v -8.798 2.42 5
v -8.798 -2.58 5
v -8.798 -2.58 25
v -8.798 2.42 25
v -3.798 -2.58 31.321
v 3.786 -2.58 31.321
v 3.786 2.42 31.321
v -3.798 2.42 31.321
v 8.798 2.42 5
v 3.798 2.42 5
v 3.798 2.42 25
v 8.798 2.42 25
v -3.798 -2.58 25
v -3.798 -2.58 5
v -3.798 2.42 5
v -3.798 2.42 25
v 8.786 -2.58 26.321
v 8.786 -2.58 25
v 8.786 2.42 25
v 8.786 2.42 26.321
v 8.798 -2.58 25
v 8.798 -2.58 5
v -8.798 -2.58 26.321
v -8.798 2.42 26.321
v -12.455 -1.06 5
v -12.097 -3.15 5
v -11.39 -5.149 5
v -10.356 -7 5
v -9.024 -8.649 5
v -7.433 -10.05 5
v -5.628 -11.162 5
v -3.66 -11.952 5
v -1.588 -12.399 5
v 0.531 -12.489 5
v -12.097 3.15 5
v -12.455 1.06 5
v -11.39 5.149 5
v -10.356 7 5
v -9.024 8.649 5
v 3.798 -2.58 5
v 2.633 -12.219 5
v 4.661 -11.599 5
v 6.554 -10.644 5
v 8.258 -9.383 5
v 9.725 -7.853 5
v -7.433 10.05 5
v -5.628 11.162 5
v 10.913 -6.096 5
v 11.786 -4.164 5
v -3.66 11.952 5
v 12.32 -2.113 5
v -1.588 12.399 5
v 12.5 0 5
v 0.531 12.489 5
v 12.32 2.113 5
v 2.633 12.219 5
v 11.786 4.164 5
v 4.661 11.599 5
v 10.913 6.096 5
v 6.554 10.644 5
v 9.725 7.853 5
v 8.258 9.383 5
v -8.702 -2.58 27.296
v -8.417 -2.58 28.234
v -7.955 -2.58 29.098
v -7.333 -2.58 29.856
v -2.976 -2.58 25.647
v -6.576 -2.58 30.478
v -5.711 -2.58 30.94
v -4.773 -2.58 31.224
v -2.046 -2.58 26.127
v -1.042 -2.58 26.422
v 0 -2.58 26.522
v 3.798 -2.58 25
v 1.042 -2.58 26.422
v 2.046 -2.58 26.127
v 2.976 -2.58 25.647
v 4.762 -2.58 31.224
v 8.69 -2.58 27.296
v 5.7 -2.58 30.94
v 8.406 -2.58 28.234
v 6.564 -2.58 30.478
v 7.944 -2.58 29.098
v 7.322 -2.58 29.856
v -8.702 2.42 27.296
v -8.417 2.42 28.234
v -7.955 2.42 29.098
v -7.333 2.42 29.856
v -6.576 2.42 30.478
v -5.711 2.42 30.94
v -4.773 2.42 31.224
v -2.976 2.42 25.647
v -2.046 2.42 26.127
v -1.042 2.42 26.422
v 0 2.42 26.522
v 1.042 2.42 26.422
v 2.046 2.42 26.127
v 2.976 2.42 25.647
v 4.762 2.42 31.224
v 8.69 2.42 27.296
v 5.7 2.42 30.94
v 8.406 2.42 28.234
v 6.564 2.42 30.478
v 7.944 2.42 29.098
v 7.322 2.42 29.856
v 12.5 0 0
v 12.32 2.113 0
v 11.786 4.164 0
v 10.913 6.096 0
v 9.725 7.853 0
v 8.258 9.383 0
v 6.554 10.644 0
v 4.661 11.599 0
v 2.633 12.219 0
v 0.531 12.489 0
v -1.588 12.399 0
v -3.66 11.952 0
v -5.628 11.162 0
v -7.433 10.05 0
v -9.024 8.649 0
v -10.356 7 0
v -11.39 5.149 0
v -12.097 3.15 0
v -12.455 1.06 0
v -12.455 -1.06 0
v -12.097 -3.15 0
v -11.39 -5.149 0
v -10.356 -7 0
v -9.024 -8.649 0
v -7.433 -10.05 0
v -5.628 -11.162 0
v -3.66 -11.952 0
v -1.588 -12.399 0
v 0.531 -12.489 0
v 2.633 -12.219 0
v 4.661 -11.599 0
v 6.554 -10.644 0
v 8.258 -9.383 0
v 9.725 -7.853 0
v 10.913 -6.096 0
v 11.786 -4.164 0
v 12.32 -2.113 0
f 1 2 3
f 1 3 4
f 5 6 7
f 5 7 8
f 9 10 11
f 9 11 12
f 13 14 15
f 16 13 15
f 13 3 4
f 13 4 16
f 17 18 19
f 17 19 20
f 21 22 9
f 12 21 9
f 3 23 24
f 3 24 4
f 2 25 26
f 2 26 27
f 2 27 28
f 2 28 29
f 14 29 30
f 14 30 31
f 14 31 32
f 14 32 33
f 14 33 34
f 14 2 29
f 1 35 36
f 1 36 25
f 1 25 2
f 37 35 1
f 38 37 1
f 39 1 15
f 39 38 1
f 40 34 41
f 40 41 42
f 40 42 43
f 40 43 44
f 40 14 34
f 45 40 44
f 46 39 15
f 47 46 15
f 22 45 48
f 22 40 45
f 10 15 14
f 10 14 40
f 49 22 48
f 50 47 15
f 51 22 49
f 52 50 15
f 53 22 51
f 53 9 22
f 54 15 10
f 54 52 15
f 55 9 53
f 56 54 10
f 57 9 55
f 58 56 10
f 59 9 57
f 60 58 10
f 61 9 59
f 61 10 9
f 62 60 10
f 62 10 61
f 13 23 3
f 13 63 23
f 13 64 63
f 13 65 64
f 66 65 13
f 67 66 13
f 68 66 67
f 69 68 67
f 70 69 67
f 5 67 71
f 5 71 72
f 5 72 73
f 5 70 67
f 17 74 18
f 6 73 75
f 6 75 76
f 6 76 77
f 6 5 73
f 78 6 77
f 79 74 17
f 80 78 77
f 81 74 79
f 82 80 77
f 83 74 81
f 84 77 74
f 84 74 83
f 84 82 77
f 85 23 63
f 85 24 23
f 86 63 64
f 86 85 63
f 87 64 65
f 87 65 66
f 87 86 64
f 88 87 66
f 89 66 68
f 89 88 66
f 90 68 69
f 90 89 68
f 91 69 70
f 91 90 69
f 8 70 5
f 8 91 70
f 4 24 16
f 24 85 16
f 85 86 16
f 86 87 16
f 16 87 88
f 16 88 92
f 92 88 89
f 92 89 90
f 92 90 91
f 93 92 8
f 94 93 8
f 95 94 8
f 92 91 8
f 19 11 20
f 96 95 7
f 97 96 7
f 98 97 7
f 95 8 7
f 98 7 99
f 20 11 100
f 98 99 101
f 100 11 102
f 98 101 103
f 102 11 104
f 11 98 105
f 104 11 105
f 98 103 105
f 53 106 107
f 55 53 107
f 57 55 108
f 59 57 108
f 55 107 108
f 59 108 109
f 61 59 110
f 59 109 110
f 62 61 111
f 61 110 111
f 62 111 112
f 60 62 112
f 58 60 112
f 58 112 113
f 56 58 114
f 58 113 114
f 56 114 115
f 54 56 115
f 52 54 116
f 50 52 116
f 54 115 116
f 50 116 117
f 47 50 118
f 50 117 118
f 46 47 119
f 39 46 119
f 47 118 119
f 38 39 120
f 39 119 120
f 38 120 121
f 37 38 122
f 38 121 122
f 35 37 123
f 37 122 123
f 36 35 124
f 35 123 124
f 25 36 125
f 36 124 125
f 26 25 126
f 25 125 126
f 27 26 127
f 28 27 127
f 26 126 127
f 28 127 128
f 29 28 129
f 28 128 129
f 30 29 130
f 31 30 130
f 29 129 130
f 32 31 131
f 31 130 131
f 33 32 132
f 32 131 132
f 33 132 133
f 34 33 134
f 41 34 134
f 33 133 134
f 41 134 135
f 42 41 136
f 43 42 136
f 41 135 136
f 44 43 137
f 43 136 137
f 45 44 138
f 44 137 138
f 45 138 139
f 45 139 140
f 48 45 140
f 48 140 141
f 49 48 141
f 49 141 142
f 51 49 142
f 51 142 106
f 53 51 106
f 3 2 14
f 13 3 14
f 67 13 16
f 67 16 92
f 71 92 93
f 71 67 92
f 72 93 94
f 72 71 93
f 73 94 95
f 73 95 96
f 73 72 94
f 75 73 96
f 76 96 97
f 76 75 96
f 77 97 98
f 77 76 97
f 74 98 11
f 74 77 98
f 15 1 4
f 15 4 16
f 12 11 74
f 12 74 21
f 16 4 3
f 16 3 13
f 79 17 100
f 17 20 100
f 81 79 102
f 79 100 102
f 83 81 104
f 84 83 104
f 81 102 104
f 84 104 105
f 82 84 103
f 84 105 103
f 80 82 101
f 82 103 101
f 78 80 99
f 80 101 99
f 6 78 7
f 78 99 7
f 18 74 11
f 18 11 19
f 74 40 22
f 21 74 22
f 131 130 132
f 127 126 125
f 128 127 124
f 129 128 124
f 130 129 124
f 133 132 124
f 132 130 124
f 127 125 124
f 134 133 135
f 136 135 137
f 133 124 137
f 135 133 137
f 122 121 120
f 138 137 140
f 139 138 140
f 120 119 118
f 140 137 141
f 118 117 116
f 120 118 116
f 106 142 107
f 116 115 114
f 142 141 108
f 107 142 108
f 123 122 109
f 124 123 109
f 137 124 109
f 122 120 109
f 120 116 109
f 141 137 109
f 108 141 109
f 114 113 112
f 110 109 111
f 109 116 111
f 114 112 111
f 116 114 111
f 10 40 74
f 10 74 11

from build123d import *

# Parameters (mm, degrees)
F0_R     = 12.5
F1_DEPTH = 5
F2_W     = 5
F2_H     = 5
F3_DEPTH = 20
F5_DEPTH = 5
F6_R     = 5


with BuildPart() as f1:
    # F0 (on Top) → F1 (new body)
    with BuildSketch(Plane.XY):
        Circle(F0_R)
    extrude(amount=F1_DEPTH)

    # F2 (on face) → F3 (join)
    with BuildSketch(Plane.XY.offset(5)):
        with Locations((-6.297843, -0.080002)):
            Rectangle(F2_W, F2_H)
        with Locations((6.297843, -0.080002)):
            Rectangle(F2_W, F2_H)
    extrude(amount=F3_DEPTH)


with BuildPart() as f5:
    # F4 (on face) → F5 (new body)
    with BuildSketch(Plane.XZ.offset(2.580002)):
        with BuildLine():
            Line((-8.797843, 31.320501), (-8.797843, 25))
            Line((-8.797843, 25), (-3.797843, 25))
            ThreePointArc((-3.797843, 25), (0, 26.521761), (3.797843, 25))
            Line((3.797843, 25), (8.786377, 25))
            Line((8.786377, 25), (8.786377, 31.320501))
            Line((8.786377, 31.320501), (-8.797843, 31.320501))
        make_face()
    extrude(amount=-F5_DEPTH)

    # F6
    f6_edges = [f5.edges().sort_by_distance(p)[0] for p in [
        (8.786377, -0.080002, 31.320501),
        (-8.797843, -0.080002, 31.320501),
    ]]
    fillet(f6_edges, radius=F6_R)


solid = Compound([f1.part, f5.part])
